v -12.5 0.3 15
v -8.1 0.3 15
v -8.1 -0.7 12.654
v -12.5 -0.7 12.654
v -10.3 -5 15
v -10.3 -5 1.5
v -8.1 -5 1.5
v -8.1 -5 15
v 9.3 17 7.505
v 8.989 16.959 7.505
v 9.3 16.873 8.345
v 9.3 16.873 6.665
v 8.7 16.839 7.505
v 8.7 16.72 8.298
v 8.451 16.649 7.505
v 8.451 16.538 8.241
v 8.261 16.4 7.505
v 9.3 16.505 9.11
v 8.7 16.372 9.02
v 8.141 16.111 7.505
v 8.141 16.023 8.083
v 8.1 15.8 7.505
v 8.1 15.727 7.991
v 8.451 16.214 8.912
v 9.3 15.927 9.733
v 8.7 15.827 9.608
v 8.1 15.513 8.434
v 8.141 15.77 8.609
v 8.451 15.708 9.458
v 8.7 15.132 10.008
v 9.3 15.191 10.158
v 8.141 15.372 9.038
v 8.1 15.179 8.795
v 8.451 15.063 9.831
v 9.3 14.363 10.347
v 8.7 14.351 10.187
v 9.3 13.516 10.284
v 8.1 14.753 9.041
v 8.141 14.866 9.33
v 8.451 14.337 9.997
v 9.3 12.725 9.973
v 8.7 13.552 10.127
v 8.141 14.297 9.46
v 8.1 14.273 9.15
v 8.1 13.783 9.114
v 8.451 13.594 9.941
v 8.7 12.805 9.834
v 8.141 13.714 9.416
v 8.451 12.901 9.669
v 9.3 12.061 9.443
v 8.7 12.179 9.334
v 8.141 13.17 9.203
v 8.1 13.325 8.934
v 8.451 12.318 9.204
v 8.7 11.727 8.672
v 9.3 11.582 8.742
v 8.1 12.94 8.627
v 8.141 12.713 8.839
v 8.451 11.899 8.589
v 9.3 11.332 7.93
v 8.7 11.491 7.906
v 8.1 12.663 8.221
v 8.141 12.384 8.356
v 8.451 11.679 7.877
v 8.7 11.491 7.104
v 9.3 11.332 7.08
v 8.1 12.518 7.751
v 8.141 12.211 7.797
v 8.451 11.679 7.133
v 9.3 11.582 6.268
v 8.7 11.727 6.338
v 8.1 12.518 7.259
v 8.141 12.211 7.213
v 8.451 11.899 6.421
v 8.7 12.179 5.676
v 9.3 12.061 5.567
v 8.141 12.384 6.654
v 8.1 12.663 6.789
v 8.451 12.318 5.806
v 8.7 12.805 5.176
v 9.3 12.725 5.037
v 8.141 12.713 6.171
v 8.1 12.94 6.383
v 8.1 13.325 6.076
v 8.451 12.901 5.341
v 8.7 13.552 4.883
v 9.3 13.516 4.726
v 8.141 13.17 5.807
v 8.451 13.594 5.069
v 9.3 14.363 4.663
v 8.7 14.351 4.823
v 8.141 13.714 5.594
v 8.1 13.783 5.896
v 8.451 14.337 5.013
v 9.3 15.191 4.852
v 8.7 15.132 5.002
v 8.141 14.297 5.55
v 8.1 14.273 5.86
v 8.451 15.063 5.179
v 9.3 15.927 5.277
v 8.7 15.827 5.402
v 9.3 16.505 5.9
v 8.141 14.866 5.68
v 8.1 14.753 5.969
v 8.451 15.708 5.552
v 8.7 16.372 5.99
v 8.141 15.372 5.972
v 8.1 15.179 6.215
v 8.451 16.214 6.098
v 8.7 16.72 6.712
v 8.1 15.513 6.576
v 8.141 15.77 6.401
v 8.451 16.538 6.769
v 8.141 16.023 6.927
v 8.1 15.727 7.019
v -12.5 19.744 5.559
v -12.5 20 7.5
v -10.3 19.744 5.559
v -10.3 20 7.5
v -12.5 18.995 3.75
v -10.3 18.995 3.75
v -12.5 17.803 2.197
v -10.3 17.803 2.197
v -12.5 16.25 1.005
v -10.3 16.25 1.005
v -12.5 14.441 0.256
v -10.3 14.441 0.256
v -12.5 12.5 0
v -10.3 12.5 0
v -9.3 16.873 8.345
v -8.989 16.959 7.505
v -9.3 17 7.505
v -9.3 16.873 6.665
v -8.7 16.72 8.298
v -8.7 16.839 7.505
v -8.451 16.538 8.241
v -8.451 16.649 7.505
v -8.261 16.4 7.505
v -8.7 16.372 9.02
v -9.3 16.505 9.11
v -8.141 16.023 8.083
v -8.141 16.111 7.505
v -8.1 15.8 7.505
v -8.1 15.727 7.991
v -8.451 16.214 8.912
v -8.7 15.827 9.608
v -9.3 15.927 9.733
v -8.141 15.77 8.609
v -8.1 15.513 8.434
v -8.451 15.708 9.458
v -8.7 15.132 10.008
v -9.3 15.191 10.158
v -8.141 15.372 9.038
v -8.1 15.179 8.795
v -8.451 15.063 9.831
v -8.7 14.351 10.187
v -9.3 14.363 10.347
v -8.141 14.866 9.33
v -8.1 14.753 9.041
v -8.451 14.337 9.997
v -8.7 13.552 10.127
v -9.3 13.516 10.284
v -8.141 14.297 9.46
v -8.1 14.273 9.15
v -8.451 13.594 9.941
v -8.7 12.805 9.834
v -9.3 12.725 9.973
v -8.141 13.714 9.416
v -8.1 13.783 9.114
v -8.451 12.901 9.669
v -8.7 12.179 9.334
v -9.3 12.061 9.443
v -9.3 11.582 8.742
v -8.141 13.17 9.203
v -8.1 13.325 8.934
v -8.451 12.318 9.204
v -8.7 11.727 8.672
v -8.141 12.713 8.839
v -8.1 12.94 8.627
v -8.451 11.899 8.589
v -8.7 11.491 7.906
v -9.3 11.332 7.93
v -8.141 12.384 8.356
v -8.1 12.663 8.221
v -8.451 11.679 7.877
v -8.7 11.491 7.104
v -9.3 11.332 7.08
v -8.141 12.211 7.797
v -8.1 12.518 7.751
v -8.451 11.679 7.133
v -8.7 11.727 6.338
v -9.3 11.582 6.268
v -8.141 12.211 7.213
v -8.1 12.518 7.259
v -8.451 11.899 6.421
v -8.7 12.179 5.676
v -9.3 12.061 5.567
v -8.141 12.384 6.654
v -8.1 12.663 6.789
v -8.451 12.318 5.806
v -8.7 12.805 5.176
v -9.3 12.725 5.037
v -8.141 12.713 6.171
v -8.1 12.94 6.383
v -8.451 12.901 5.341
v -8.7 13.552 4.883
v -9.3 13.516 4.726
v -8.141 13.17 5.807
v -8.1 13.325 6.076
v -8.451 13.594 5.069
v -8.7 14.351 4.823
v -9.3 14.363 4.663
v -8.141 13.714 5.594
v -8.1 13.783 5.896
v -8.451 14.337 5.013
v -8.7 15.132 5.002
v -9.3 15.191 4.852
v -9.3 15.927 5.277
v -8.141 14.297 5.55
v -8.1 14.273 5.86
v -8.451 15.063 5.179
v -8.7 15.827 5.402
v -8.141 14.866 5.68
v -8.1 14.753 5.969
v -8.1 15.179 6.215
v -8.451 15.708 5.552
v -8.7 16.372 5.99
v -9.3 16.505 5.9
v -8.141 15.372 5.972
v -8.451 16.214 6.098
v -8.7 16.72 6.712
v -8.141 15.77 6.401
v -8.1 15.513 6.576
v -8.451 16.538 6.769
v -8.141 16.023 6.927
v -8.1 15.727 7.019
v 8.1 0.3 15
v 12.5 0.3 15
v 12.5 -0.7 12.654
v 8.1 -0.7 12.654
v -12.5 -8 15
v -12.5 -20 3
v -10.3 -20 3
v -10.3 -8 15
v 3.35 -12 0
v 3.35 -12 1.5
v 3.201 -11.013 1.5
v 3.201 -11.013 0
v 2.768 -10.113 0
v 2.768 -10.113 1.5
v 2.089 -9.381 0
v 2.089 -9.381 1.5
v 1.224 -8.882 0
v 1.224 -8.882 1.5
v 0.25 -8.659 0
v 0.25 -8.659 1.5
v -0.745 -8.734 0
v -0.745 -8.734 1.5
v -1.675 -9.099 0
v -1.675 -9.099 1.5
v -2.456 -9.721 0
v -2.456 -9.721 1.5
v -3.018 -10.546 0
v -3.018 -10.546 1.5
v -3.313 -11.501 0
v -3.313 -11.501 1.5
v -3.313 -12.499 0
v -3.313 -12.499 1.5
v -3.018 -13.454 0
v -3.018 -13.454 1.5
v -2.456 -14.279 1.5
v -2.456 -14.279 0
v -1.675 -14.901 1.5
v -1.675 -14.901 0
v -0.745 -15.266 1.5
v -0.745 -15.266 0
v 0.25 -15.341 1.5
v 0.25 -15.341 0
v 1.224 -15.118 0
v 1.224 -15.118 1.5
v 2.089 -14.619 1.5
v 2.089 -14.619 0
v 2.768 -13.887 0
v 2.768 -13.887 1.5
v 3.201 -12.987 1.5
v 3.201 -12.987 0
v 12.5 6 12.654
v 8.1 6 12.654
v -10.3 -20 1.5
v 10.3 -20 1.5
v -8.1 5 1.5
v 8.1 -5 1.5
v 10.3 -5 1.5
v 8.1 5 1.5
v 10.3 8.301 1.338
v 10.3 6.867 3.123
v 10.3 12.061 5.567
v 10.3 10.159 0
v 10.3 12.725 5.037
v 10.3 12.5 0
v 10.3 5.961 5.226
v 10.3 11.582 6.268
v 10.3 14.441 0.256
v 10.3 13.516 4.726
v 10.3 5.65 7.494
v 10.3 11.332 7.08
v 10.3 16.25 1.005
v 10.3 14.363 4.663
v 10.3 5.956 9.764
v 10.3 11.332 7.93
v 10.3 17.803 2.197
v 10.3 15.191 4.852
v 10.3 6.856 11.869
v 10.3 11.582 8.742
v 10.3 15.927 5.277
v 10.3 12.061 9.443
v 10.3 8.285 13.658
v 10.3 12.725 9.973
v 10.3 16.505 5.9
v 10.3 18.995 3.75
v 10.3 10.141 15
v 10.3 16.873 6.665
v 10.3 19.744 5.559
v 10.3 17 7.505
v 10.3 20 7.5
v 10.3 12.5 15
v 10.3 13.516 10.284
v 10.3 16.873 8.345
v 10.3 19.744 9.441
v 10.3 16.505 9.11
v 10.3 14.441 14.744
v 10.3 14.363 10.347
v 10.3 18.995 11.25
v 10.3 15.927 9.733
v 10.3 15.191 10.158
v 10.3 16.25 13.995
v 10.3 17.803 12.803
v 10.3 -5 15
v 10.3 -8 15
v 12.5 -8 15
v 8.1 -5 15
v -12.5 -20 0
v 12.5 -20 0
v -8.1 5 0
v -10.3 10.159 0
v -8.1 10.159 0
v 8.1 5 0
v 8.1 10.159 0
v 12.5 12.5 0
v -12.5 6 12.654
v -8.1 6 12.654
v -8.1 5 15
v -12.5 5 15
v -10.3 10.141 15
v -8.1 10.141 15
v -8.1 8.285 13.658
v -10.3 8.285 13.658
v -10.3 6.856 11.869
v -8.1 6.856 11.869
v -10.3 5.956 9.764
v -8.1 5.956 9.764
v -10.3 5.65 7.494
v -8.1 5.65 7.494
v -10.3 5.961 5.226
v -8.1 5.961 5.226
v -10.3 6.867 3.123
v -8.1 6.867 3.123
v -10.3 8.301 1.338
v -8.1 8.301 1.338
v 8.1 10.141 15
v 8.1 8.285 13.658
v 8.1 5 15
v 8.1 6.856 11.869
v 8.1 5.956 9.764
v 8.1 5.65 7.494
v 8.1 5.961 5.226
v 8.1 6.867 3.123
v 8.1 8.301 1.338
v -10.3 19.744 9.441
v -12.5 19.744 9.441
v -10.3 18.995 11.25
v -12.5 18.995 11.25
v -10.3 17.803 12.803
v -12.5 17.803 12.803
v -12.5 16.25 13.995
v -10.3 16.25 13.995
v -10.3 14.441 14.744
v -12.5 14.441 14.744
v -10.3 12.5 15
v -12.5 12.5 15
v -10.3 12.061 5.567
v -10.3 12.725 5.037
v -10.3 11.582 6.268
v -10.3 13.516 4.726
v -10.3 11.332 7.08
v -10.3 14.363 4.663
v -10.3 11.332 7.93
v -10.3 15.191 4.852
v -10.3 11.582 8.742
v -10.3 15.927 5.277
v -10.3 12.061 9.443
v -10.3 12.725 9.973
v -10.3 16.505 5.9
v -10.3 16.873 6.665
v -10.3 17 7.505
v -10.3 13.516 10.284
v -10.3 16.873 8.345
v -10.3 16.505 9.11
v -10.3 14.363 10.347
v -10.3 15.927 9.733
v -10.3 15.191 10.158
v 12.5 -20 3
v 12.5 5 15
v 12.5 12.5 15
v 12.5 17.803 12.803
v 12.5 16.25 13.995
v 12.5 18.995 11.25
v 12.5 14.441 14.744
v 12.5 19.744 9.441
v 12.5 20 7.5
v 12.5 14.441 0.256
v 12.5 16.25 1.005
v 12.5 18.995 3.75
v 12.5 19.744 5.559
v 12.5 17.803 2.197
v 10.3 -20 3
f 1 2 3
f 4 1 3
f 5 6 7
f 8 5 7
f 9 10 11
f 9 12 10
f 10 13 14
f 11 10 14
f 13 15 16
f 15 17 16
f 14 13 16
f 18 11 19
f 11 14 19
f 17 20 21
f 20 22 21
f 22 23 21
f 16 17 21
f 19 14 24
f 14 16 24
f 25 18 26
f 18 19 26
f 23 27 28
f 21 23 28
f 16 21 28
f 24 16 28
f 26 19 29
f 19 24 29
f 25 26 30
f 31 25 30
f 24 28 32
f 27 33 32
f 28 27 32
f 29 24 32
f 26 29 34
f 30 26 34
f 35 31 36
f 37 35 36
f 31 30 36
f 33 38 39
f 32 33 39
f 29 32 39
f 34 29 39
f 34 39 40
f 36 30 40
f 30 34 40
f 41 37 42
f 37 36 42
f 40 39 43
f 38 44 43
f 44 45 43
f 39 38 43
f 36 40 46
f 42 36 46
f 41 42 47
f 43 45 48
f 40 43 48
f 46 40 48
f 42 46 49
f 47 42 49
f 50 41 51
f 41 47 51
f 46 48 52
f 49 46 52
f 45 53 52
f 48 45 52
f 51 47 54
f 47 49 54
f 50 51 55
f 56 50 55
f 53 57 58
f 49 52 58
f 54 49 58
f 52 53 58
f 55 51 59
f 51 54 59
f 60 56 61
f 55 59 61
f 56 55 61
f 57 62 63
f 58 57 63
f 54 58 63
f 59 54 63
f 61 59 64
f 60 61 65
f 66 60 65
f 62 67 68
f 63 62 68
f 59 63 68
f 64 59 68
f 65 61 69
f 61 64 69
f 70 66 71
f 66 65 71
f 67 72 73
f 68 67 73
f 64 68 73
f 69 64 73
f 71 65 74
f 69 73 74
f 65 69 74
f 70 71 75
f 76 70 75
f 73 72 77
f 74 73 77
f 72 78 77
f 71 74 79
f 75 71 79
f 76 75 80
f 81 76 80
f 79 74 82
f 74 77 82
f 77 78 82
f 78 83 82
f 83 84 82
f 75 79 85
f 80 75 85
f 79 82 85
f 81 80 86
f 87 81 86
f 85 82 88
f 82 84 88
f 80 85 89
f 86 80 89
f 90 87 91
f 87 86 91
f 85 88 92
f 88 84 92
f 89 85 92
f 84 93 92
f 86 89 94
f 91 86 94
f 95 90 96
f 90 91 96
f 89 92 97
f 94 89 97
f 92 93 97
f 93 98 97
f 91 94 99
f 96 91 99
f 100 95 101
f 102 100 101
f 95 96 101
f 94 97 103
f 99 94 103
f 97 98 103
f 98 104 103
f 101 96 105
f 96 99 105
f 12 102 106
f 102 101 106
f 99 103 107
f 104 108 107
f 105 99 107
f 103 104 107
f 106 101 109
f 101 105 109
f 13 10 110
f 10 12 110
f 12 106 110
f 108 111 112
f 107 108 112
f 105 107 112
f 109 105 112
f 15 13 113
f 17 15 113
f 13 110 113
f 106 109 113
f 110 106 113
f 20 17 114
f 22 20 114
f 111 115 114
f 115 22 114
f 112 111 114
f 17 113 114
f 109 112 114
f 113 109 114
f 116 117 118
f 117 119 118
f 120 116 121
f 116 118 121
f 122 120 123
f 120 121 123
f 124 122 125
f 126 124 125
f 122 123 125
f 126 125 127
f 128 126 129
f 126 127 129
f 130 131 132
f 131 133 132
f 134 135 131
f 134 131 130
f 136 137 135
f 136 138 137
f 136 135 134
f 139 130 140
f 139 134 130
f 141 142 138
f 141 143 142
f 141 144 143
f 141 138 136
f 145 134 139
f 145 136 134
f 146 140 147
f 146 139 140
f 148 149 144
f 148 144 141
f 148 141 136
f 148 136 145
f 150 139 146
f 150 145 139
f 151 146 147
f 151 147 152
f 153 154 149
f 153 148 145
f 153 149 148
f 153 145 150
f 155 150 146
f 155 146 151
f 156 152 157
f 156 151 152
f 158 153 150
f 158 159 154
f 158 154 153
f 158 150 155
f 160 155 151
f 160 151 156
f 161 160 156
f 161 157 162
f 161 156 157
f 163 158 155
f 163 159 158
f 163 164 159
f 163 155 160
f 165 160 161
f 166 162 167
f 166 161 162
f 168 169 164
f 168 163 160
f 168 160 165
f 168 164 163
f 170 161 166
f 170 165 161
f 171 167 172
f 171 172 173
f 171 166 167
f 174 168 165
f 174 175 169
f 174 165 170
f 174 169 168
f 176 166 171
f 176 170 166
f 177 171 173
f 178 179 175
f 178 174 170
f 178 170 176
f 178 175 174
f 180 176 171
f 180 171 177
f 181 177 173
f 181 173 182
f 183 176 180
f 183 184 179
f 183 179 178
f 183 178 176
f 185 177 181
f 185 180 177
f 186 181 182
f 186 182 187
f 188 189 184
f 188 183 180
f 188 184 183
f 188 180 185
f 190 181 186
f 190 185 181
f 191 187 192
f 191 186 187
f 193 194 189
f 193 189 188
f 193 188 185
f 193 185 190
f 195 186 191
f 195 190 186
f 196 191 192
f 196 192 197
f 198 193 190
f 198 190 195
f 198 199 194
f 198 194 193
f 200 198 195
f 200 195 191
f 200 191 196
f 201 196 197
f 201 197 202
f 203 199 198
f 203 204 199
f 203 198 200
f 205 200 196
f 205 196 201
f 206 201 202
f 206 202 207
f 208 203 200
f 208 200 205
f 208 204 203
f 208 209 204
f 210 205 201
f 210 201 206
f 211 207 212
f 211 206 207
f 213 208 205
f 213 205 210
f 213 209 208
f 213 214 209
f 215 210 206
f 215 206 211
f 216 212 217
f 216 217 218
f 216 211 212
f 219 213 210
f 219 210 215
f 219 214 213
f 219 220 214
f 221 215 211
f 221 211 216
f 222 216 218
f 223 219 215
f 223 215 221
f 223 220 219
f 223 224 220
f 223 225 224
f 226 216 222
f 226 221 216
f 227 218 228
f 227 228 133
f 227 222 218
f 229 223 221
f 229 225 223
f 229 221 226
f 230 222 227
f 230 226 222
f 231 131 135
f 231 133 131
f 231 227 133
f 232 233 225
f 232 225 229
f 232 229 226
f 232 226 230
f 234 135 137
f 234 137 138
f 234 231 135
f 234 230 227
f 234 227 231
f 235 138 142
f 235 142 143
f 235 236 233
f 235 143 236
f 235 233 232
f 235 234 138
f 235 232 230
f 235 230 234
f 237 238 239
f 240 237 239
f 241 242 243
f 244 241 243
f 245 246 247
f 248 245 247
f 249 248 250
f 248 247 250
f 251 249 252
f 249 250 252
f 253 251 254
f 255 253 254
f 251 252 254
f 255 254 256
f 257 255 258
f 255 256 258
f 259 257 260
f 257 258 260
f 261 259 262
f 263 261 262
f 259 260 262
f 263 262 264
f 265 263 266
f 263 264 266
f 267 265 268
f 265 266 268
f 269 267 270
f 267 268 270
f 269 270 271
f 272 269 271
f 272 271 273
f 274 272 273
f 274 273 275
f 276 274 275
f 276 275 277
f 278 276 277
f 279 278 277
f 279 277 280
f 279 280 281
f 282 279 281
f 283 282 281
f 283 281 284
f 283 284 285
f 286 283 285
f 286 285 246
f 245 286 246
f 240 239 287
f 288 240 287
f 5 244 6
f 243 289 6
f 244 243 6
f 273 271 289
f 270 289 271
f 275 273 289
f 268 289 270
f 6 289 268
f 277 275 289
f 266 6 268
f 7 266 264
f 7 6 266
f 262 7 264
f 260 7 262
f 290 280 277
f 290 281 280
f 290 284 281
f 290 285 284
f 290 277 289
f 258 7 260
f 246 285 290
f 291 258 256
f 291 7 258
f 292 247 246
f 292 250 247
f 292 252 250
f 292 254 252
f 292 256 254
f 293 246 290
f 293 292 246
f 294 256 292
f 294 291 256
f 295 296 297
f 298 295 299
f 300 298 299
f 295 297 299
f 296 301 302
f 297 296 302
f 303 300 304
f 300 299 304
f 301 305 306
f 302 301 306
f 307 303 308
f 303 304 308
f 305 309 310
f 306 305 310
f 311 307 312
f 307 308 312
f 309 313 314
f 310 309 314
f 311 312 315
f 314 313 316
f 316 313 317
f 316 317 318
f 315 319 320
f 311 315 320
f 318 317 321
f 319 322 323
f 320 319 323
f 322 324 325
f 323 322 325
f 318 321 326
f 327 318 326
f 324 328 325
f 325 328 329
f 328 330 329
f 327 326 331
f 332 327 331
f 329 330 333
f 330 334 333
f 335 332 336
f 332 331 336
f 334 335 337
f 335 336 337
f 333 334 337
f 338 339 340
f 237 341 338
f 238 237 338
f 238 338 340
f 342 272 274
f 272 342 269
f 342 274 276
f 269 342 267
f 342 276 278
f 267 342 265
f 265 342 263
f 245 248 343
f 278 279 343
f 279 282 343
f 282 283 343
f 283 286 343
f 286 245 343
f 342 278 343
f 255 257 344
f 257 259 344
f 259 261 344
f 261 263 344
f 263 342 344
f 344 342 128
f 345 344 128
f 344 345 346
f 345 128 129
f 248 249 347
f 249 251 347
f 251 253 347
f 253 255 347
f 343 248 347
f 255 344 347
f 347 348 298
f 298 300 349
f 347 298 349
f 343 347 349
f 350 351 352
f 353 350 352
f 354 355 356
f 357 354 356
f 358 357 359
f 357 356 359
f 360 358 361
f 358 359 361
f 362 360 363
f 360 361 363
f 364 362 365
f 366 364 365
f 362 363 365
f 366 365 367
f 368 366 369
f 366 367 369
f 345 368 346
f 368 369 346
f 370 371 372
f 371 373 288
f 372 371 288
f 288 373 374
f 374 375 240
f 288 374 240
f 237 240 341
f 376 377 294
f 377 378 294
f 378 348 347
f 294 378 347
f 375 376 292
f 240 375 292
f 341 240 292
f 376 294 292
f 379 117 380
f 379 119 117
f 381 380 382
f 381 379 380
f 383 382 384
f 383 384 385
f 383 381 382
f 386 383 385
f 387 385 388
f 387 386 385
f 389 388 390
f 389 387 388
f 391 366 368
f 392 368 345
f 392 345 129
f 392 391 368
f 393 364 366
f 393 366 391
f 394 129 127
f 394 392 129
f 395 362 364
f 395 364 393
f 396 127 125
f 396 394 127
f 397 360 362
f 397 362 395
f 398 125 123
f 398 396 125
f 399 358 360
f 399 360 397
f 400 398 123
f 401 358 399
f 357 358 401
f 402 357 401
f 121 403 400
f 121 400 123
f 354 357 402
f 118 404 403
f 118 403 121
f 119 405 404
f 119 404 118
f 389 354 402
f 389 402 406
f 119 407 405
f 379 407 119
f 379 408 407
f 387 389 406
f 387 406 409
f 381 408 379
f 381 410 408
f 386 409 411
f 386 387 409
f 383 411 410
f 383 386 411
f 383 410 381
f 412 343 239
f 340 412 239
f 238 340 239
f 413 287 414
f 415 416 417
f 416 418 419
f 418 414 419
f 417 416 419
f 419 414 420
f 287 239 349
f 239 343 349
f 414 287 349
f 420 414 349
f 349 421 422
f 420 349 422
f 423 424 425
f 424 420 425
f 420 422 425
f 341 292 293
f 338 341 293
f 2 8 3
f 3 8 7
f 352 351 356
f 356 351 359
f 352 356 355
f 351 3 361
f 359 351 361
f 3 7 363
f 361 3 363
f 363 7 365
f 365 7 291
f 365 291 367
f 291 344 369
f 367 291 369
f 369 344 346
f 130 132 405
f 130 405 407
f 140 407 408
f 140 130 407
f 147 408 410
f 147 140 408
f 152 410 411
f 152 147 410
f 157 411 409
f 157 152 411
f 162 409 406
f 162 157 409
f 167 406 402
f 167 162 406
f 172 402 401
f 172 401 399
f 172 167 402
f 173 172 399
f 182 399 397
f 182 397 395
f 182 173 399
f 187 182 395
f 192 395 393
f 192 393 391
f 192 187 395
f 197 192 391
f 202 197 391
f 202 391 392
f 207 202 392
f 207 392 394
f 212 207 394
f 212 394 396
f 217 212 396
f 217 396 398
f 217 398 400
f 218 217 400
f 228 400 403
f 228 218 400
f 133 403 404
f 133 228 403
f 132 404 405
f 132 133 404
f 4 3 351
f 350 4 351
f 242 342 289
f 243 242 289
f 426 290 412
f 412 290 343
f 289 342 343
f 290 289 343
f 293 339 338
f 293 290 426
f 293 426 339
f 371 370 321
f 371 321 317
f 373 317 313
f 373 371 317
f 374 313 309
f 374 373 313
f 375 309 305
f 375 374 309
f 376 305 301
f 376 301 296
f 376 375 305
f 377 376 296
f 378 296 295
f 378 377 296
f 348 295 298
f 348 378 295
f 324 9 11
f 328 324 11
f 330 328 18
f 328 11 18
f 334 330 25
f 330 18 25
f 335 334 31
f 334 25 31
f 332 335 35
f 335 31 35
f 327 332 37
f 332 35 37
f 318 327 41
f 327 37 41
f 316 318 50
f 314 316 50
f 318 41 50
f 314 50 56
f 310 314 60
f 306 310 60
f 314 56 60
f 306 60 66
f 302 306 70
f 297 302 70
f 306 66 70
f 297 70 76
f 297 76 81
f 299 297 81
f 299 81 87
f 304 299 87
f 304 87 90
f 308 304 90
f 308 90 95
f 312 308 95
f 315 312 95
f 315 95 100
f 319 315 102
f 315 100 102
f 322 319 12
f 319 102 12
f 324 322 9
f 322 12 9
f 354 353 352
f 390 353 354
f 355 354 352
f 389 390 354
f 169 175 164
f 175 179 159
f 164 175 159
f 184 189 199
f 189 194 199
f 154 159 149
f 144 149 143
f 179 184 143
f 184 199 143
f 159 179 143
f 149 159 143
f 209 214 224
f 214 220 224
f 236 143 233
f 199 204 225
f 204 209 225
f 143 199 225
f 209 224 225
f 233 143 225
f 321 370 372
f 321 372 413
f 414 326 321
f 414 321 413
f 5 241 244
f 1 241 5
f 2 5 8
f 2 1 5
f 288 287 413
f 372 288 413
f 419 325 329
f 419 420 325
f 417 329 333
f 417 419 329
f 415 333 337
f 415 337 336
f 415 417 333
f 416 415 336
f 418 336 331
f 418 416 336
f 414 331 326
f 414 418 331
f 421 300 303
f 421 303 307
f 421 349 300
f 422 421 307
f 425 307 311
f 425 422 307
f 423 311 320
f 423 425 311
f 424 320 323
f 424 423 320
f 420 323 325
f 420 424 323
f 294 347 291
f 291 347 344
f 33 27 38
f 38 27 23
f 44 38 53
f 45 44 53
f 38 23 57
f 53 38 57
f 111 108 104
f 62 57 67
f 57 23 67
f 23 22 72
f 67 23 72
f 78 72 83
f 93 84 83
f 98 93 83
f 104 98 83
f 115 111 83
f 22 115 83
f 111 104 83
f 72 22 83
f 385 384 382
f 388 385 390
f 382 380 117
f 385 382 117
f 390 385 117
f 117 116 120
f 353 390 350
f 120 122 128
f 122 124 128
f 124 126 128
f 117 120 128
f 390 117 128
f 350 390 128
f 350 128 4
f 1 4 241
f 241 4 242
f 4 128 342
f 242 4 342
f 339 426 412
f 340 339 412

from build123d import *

# Parameters (mm, degrees)
F0_W      = 2.2
F0_H      = 15
F1_DEPTH  = 1.5
F0_W_2    = 4.4
F0_H_2    = 4.6
F2_DEPTH  = 15
F3_SIZE   = 12
F5_DEPTH  = 25
F6_R      = 2.85
F7_DEPTH  = 2.2
F8_R      = 1.2
F9_R      = 7.49999
F10_R     = 3.35
F11_DEPTH = 25


# Not quite as in the source:
# - a fillet or chamfer is up to 0.001 mm smaller than in the source, because OpenCascade refuses the exact size
# - a pattern or mirror of a feature is missing from the dataset's text; its kind, count and spacing are read off the source's solid


with BuildPart() as f1:
    # F0 (on Top) → F1 (new body)
    with BuildSketch(Plane.XY):
        Polygon((8.1, 0.4), (8.1, 5), (-8.1, 5), (-8.1, 0.4), (-8.1, -5), (-8.1, -20), (8.1, -20), (8.1, -5), align=None)
        with Locations((-9.2, -12.5)):
            Rectangle(F0_W, F0_H)
        with Locations((9.2, -12.5)):
            Rectangle(F0_W, F0_H)
    extrude(amount=F1_DEPTH)

    # F0 (on Top) → F2 (join)
    with BuildSketch(Plane.XY):
        with Locations((-10.3, 12.5)):
            Rectangle(F0_W_2, F0_H)
        with Locations((10.3, 12.5)):
            Rectangle(F0_W_2, F0_H)
        with Locations((-10.3, 2.7)):
            Rectangle(F0_W_2, F0_H_2)
        with Locations((10.3, 2.7)):
            Rectangle(F0_W_2, F0_H_2)
        with Locations((-11.4, -12.5)):
            Rectangle(F0_W, F0_H)
        Polygon((-8.1, -5), (-8.1, 0.4), (-12.5, 0.4), (-12.5, -5), (-10.3, -5), align=None)
        Polygon((12.5, -5), (12.5, 0.4), (8.1, 0.4), (8.1, -5), (10.3, -5), align=None)
        with Locations((11.4, -12.5)):
            Rectangle(F0_W, F0_H)
    extrude(amount=F2_DEPTH)

    # F3
    f3_edges = [f1.edges().sort_by_distance(p)[0] for p in [
        (11.4, -20, 15),
        (-11.4, -20, 15),
    ]]
    chamfer(f3_edges, length=F3_SIZE)

    # F4 (on face) → F5 (cut)
    with BuildSketch(Plane.YZ.offset(12.5)):
        Polygon((6, 12.653529644), (5, 15), (0.3, 15), (-0.7, 12.653529644), align=None)
    extrude(amount=-F5_DEPTH, mode=Mode.SUBTRACT)

    # F6 (on face) → F7 (cut)
    with BuildSketch(Plane.YZ.offset(-8.1)):
        with BuildLine():
            Line((20, 1.3383538289), (20, 13.6716461711))
            ThreePointArc((20, 13.6716461711), (19.1242226672, 14.3975416295), (18.1593630584, 15))
            Line((18.1593630584, 15), (10.1406412151, 15))
            ThreePointArc((10.1406412151, 15), (5.6500087774, 7.4943749708), (10.1593912813, 0))
            Line((10.1593912813, 0), (18.1406129922, 0))
            ThreePointArc((18.1406129922, 0), (19.1156030804, 0.6062459626), (20, 1.3383538289))
        make_face()
        with Locations((14.1500021368, 7.505)):
            Circle(F6_R, mode=Mode.SUBTRACT)
    f7 = extrude(amount=-F7_DEPTH, mode=Mode.SUBTRACT)

    # F7_copies: F7 across plane
    add(f7.mirror(Plane(origin=(0, 0, 0), x_dir=(0, 0, 1), z_dir=(1, 0, 0))), mode=Mode.SUBTRACT)

    # F8
    f8_edges = [f1.edges().sort_by_distance(p)[0] for p in [
        (-8.1, 11.300002, 7.505),
        (8.1, 11.300002, 7.505),
    ]]
    fillet(f8_edges, radius=F8_R)

    # F9 (radius 7.5 in the source; OpenCascade refuses exactly that, so slightly less here)
    f9_edges = [f1.edges().sort_by_distance(p)[0] for p in [
        (-10.3, 20, 15),
        (-10.3, 20, 0),
        (10.3, 20, 15),
        (10.3, 20, 0),
    ]]
    fillet(f9_edges, radius=F9_R)

    # F10 (on face) → F11 (cut)
    with BuildSketch(Plane.XY.offset(1.5)):
        with Locations((0, -12)):
            Circle(F10_R)
    extrude(amount=-F11_DEPTH, mode=Mode.SUBTRACT)


solid = f1.part
